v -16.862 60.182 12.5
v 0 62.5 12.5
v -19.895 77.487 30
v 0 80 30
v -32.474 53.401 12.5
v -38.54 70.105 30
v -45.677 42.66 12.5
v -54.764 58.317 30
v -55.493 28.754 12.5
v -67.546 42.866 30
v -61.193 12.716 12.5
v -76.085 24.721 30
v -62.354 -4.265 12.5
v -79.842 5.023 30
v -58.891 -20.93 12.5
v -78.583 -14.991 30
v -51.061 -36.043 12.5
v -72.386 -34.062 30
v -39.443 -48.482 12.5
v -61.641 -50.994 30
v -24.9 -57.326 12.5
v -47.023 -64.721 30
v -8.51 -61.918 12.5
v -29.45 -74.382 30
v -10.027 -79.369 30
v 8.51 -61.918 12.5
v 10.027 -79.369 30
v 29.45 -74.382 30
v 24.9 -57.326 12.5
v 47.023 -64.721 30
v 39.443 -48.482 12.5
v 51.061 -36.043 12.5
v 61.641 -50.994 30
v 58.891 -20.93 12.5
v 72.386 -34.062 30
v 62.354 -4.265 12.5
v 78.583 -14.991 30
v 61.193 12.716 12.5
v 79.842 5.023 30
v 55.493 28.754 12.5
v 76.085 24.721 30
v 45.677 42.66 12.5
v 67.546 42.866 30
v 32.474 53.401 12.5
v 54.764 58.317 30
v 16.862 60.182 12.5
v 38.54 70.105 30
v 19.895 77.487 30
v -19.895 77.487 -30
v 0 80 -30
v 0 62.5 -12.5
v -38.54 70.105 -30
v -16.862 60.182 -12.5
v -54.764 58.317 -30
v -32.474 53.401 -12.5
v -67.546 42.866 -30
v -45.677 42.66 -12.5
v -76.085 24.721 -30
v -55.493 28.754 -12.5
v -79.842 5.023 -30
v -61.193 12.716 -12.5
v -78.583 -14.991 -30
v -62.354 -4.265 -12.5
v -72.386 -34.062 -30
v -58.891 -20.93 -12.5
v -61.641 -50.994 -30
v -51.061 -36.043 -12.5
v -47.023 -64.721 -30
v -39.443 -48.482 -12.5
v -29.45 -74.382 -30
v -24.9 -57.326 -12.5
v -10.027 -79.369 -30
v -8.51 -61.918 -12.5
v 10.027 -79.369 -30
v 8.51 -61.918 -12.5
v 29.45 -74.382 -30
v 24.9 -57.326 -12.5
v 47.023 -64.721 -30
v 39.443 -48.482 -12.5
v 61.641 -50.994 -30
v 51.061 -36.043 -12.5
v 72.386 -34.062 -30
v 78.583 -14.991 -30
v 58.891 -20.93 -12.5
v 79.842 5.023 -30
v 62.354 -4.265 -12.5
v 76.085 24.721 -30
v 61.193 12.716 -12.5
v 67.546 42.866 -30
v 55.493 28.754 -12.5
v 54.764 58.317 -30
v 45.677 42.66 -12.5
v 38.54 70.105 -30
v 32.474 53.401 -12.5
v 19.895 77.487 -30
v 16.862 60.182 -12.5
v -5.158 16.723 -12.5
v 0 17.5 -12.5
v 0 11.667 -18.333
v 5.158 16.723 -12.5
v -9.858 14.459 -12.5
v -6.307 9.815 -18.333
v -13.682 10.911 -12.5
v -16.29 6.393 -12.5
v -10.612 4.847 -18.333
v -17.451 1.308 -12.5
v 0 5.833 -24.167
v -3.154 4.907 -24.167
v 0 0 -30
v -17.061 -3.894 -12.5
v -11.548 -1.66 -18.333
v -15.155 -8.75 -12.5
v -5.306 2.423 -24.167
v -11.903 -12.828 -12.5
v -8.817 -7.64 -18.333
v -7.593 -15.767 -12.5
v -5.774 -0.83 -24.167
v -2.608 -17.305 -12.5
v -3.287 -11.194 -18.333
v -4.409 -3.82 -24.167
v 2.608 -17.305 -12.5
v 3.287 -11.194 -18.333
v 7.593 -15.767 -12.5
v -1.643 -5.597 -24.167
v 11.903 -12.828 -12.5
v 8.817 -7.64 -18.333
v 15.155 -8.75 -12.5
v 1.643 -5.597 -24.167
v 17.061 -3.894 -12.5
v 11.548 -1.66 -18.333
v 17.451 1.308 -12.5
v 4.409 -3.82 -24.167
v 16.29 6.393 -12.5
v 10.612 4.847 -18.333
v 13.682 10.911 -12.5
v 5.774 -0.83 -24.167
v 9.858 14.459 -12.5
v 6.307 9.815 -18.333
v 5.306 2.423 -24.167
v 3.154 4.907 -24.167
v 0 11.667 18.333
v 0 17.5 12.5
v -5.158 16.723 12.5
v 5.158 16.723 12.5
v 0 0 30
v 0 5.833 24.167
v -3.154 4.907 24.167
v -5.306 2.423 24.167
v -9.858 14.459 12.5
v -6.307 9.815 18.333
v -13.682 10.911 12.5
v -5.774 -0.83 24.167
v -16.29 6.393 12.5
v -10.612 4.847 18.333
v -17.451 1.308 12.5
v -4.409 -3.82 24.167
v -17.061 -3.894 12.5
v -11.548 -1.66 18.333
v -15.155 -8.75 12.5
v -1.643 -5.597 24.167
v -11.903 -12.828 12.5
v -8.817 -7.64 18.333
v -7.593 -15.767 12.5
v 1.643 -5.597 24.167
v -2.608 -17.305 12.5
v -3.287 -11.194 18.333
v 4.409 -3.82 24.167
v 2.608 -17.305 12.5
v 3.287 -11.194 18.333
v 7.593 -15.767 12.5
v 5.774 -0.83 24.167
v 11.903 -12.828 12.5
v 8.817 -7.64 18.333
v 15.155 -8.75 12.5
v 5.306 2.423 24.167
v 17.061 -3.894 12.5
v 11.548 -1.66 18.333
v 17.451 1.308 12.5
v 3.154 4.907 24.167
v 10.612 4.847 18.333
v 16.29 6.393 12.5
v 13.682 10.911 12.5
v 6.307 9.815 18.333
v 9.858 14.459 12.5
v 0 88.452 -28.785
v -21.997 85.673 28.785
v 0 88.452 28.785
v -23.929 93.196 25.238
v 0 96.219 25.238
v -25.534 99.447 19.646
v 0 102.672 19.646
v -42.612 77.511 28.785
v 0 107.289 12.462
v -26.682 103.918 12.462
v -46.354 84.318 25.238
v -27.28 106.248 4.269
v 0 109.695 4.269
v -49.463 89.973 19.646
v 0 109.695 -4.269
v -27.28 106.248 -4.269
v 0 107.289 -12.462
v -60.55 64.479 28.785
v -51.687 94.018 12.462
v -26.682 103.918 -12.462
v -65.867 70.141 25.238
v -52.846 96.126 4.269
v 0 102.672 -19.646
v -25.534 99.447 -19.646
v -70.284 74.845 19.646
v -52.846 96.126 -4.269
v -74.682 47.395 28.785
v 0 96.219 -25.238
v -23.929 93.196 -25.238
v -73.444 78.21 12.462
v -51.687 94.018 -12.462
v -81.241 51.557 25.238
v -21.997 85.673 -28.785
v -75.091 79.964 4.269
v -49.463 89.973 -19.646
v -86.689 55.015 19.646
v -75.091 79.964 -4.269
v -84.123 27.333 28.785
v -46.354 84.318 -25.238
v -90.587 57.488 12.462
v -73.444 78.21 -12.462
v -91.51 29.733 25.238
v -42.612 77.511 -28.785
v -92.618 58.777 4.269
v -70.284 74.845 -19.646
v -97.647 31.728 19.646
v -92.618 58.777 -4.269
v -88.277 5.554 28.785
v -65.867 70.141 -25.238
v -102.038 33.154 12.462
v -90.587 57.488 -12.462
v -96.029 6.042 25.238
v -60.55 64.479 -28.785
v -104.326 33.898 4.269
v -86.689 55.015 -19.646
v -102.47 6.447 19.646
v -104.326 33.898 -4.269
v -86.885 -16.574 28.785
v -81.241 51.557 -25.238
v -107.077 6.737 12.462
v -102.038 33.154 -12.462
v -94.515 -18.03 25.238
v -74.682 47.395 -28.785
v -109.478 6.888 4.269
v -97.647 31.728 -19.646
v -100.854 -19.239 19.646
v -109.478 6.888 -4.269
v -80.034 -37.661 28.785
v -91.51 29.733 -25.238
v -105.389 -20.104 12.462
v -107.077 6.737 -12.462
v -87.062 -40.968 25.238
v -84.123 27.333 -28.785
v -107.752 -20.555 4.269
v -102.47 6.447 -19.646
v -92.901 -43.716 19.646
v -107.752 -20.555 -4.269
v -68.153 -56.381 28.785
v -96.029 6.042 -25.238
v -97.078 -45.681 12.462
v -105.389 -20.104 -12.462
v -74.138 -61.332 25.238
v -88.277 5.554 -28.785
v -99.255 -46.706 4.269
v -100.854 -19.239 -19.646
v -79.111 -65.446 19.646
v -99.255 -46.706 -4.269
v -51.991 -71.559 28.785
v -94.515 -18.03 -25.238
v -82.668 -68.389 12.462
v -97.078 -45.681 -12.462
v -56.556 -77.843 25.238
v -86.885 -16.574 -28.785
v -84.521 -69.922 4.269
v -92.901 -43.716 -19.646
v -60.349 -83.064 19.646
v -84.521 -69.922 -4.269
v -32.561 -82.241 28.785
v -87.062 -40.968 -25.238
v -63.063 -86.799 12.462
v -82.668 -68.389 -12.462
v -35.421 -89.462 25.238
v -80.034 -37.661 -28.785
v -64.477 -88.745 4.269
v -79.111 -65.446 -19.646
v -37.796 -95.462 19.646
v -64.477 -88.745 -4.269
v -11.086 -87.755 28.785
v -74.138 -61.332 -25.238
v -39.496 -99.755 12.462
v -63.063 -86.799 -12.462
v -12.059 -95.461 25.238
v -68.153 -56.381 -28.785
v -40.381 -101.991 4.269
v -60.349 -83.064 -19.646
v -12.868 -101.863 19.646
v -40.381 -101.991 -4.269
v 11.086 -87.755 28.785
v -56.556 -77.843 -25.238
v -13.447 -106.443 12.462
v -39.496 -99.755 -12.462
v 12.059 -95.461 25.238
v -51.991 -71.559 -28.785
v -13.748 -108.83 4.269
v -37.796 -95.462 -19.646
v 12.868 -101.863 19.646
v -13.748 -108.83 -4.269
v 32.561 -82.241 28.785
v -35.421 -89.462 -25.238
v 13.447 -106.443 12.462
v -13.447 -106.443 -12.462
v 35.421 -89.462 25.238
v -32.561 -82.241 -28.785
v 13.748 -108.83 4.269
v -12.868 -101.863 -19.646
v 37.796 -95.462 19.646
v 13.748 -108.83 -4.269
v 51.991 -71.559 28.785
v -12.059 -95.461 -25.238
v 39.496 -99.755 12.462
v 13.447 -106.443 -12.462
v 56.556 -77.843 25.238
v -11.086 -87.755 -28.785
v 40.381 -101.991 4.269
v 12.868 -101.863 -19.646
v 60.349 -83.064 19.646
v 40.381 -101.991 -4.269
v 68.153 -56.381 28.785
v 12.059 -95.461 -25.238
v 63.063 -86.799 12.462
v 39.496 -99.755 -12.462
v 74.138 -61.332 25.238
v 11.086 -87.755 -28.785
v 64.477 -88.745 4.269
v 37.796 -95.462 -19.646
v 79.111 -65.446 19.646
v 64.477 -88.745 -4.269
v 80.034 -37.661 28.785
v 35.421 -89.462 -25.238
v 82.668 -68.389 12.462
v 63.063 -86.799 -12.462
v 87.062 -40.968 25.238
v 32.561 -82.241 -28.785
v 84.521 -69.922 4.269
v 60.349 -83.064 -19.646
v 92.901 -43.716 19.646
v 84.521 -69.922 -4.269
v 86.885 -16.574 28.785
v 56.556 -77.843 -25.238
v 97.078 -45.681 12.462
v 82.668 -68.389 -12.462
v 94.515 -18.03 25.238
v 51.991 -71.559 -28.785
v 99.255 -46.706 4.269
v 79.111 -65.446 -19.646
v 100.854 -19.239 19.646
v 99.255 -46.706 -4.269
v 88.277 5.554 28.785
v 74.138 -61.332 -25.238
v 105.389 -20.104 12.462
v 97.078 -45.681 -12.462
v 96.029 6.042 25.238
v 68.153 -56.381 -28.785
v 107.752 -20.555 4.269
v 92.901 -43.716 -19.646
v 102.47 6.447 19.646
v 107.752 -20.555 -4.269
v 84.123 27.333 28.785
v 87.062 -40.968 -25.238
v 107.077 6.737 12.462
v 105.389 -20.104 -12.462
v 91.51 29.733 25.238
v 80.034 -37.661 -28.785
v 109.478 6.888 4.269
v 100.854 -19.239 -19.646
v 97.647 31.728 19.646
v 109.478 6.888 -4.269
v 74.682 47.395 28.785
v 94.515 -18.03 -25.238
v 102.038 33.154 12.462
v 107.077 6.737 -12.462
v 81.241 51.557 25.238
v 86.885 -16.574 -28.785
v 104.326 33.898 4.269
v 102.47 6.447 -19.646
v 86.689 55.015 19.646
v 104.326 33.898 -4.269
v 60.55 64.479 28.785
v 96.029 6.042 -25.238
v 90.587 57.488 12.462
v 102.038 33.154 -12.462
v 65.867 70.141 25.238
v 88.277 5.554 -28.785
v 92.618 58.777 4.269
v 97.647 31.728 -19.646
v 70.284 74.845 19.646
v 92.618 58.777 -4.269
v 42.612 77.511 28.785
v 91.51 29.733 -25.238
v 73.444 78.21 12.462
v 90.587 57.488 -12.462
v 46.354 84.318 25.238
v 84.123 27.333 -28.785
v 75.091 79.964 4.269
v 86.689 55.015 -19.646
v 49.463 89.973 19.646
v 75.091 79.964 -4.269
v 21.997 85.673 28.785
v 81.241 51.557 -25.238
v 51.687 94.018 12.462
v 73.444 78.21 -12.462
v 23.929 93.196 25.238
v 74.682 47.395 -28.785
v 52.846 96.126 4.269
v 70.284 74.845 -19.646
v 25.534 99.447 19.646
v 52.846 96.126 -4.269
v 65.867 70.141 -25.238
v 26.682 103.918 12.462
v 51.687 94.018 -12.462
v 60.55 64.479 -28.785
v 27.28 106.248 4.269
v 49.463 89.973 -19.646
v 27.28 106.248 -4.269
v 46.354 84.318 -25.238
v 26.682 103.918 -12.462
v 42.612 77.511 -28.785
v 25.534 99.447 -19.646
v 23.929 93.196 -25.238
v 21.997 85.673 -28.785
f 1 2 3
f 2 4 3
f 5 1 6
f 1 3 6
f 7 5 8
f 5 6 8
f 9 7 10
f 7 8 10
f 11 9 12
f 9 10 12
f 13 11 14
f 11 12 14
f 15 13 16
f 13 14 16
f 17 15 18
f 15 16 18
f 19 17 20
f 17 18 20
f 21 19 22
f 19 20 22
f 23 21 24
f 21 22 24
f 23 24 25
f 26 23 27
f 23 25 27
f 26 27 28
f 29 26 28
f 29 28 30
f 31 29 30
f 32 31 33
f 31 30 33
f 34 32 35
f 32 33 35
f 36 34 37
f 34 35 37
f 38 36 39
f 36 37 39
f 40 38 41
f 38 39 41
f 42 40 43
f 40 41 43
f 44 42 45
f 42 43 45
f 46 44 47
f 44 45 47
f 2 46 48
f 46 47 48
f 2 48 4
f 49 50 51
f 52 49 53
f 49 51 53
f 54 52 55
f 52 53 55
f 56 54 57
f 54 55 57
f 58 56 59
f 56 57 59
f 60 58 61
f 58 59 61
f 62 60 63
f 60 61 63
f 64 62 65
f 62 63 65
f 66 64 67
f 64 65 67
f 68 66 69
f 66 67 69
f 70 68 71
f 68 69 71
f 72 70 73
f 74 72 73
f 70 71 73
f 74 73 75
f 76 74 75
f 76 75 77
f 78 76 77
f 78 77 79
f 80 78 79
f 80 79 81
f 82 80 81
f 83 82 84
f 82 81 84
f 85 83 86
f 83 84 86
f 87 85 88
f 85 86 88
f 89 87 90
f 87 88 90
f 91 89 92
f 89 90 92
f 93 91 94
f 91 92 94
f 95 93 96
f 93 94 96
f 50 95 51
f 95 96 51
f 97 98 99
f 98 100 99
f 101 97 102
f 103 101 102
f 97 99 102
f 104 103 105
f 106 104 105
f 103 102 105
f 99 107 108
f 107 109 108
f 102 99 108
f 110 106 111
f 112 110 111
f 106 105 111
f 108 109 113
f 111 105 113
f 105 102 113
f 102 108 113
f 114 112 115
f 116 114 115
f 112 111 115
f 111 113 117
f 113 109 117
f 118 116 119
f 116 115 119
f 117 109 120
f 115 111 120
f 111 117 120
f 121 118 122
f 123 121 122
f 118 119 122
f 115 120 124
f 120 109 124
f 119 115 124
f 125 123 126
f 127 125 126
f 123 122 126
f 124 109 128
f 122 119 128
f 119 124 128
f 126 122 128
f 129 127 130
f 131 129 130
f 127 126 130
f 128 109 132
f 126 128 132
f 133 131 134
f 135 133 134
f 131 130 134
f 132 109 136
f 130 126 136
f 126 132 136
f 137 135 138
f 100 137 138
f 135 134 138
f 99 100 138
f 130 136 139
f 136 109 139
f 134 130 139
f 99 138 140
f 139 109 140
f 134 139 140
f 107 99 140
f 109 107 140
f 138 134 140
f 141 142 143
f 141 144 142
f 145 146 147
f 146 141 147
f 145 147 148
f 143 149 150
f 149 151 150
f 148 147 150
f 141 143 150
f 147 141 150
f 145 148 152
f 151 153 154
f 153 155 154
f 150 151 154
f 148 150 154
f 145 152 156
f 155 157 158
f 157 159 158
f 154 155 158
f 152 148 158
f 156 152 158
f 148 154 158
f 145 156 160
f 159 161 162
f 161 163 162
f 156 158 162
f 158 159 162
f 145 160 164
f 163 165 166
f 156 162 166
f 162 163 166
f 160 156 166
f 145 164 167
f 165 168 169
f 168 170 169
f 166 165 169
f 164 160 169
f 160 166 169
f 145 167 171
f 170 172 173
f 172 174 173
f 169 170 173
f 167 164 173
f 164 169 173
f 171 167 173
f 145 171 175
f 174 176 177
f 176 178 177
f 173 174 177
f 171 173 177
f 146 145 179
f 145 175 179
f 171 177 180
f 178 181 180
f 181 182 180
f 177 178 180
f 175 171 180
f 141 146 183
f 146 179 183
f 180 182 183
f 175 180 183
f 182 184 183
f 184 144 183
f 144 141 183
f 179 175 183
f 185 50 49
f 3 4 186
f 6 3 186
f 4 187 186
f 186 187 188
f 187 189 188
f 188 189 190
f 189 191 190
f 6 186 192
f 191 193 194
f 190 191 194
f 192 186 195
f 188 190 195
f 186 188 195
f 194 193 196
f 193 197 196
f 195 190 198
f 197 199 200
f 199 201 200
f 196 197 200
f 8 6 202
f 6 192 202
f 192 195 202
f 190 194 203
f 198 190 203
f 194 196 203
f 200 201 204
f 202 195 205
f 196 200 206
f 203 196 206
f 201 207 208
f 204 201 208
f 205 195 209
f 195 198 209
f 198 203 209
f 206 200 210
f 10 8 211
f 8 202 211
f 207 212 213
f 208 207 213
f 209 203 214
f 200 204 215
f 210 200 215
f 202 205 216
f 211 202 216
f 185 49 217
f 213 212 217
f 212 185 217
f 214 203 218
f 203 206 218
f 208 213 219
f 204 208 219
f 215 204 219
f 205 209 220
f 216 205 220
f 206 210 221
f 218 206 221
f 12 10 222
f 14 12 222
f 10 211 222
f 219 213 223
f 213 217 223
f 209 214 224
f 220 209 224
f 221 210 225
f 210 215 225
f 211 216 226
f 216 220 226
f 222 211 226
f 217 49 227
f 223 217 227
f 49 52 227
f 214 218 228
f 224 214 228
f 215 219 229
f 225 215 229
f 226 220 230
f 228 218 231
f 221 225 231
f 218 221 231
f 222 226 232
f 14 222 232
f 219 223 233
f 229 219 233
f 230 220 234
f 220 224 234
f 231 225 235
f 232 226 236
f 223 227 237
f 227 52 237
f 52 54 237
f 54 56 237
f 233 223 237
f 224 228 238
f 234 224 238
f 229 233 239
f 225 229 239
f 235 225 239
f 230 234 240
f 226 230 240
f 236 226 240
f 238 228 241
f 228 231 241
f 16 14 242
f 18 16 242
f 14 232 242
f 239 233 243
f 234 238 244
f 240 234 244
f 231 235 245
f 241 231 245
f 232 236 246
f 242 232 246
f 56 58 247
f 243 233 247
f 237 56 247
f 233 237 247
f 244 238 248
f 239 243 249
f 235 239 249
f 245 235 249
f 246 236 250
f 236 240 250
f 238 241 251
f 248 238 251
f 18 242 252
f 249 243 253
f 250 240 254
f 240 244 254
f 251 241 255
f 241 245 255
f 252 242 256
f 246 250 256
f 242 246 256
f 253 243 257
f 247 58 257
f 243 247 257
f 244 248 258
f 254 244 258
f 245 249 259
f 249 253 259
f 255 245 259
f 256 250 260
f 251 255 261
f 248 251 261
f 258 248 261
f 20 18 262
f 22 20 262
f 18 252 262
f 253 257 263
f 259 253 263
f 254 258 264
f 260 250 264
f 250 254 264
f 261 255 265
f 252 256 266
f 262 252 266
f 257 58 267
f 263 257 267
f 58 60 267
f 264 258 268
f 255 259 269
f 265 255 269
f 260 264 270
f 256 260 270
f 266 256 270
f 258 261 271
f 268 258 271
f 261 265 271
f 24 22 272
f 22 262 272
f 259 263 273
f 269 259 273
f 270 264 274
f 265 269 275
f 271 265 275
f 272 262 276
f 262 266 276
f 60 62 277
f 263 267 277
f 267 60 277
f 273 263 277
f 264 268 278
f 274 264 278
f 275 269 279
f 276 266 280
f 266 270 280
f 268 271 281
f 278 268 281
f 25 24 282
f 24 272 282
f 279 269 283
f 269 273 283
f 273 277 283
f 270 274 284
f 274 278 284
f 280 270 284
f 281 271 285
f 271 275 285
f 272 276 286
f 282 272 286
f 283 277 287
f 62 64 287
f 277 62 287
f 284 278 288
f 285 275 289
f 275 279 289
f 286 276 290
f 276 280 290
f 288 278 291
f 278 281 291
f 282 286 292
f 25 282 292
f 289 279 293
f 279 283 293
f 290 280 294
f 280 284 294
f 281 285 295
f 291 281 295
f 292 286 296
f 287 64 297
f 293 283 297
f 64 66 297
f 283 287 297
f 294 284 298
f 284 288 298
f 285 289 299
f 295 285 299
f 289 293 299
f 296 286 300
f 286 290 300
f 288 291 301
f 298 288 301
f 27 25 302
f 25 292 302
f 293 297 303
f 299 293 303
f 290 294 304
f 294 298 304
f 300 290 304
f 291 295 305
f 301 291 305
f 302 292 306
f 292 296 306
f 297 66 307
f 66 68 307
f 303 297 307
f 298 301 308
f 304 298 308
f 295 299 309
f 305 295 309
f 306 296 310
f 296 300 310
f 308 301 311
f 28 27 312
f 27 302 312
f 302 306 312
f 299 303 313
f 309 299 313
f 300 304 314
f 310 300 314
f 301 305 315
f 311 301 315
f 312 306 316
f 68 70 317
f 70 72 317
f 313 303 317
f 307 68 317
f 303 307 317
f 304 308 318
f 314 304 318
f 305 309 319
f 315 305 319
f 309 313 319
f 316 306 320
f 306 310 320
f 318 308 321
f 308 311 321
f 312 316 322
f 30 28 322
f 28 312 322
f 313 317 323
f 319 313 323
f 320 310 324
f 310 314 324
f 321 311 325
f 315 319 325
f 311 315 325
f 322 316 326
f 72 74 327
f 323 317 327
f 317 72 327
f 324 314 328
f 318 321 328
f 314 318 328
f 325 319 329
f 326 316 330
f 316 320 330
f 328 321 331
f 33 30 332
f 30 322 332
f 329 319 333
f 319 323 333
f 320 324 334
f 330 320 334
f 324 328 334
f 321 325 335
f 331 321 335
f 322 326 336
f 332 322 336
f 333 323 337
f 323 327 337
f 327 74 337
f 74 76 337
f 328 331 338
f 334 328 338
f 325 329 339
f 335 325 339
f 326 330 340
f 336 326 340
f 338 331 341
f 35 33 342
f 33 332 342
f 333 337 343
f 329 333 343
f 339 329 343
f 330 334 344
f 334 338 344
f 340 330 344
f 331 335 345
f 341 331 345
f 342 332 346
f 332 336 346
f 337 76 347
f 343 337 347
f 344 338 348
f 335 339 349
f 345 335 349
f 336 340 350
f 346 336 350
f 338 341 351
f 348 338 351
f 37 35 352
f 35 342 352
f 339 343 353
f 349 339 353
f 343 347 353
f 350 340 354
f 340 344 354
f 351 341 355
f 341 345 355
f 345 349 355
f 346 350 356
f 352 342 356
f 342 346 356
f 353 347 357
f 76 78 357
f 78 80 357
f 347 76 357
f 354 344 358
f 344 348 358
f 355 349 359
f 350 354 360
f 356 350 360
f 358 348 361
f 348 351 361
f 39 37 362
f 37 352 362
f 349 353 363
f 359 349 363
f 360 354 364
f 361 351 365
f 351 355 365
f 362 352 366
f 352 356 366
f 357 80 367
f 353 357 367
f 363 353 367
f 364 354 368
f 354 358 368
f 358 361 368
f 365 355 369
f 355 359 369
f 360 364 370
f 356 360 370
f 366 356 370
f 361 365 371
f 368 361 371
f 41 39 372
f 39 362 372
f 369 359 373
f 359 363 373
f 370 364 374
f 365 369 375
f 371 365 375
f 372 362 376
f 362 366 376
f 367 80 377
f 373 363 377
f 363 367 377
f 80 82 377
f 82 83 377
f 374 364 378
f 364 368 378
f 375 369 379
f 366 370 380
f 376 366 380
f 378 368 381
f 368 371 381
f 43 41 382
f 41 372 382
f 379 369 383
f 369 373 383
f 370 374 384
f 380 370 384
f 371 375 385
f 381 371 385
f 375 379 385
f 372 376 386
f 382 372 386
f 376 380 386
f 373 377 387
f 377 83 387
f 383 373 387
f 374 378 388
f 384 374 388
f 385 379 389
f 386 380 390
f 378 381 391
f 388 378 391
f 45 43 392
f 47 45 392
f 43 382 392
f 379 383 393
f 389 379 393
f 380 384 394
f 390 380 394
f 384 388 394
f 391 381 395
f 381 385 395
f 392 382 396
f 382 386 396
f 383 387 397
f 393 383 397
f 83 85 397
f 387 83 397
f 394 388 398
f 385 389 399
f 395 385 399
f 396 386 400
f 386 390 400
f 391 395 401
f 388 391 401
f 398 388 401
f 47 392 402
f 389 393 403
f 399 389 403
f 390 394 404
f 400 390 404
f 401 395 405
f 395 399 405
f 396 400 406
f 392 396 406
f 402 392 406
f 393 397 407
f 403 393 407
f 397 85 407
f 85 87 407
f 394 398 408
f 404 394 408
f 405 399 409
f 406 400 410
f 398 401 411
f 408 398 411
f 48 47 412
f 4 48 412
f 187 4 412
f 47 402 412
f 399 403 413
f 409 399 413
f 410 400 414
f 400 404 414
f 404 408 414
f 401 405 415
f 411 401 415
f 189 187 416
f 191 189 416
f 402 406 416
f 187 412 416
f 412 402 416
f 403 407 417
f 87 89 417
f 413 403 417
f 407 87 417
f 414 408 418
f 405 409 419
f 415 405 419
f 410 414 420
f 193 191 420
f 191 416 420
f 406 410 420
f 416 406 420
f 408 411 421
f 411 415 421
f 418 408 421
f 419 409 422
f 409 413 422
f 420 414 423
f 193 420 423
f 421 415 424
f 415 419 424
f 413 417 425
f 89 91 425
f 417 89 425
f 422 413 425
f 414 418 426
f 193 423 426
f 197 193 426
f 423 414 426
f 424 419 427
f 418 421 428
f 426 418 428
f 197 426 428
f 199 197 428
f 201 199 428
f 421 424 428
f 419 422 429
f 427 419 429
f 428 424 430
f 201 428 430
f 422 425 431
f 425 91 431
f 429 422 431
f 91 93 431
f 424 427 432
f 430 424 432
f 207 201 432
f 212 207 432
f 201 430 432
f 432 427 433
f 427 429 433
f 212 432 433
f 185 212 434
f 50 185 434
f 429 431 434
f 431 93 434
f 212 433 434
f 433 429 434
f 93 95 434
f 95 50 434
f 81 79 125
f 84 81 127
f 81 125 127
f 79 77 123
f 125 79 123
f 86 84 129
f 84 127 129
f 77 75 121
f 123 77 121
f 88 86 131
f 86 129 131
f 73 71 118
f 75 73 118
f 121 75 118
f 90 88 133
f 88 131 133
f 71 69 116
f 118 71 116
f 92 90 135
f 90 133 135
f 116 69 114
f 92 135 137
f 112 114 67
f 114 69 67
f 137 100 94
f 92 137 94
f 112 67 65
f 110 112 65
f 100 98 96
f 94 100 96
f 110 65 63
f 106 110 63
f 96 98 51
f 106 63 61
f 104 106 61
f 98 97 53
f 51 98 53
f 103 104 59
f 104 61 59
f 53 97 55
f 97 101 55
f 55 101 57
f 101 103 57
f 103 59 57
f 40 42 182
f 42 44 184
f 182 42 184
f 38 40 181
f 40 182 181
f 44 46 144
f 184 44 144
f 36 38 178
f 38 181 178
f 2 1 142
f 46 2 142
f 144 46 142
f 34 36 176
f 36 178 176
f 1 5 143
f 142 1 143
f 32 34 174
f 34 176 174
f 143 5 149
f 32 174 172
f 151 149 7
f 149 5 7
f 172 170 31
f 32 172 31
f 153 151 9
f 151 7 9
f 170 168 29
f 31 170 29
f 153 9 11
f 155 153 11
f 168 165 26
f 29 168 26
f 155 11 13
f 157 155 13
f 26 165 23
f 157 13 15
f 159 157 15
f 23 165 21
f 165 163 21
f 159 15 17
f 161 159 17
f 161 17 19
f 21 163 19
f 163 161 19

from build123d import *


with BuildPart() as part:
    # Sketch2 → Revolve1 (revolve)
    with BuildSketch(Plane(origin=(0, 0, 0), x_dir=(0, 0, -1), z_dir=(1, 0, 0))):
        with BuildLine():
            Line((30, 0), (-30, 0))
            Line((-30, 0), (-12.5, 17.5))
            Line((-12.5, 17.5), (-12.5, 62.5))
            Line((-12.5, 62.5), (-30, 80))
            ThreePointArc((-30, 80), (0, 110), (30, 80))
            Line((30, 80), (12.5, 62.5))
            Line((12.5, 62.5), (12.5, 17.5))
            Line((12.5, 17.5), (30, 0))
        make_face()
    revolve(axis=Axis((0, 0, -30), (0, 0, 1)))


solid = part.part
